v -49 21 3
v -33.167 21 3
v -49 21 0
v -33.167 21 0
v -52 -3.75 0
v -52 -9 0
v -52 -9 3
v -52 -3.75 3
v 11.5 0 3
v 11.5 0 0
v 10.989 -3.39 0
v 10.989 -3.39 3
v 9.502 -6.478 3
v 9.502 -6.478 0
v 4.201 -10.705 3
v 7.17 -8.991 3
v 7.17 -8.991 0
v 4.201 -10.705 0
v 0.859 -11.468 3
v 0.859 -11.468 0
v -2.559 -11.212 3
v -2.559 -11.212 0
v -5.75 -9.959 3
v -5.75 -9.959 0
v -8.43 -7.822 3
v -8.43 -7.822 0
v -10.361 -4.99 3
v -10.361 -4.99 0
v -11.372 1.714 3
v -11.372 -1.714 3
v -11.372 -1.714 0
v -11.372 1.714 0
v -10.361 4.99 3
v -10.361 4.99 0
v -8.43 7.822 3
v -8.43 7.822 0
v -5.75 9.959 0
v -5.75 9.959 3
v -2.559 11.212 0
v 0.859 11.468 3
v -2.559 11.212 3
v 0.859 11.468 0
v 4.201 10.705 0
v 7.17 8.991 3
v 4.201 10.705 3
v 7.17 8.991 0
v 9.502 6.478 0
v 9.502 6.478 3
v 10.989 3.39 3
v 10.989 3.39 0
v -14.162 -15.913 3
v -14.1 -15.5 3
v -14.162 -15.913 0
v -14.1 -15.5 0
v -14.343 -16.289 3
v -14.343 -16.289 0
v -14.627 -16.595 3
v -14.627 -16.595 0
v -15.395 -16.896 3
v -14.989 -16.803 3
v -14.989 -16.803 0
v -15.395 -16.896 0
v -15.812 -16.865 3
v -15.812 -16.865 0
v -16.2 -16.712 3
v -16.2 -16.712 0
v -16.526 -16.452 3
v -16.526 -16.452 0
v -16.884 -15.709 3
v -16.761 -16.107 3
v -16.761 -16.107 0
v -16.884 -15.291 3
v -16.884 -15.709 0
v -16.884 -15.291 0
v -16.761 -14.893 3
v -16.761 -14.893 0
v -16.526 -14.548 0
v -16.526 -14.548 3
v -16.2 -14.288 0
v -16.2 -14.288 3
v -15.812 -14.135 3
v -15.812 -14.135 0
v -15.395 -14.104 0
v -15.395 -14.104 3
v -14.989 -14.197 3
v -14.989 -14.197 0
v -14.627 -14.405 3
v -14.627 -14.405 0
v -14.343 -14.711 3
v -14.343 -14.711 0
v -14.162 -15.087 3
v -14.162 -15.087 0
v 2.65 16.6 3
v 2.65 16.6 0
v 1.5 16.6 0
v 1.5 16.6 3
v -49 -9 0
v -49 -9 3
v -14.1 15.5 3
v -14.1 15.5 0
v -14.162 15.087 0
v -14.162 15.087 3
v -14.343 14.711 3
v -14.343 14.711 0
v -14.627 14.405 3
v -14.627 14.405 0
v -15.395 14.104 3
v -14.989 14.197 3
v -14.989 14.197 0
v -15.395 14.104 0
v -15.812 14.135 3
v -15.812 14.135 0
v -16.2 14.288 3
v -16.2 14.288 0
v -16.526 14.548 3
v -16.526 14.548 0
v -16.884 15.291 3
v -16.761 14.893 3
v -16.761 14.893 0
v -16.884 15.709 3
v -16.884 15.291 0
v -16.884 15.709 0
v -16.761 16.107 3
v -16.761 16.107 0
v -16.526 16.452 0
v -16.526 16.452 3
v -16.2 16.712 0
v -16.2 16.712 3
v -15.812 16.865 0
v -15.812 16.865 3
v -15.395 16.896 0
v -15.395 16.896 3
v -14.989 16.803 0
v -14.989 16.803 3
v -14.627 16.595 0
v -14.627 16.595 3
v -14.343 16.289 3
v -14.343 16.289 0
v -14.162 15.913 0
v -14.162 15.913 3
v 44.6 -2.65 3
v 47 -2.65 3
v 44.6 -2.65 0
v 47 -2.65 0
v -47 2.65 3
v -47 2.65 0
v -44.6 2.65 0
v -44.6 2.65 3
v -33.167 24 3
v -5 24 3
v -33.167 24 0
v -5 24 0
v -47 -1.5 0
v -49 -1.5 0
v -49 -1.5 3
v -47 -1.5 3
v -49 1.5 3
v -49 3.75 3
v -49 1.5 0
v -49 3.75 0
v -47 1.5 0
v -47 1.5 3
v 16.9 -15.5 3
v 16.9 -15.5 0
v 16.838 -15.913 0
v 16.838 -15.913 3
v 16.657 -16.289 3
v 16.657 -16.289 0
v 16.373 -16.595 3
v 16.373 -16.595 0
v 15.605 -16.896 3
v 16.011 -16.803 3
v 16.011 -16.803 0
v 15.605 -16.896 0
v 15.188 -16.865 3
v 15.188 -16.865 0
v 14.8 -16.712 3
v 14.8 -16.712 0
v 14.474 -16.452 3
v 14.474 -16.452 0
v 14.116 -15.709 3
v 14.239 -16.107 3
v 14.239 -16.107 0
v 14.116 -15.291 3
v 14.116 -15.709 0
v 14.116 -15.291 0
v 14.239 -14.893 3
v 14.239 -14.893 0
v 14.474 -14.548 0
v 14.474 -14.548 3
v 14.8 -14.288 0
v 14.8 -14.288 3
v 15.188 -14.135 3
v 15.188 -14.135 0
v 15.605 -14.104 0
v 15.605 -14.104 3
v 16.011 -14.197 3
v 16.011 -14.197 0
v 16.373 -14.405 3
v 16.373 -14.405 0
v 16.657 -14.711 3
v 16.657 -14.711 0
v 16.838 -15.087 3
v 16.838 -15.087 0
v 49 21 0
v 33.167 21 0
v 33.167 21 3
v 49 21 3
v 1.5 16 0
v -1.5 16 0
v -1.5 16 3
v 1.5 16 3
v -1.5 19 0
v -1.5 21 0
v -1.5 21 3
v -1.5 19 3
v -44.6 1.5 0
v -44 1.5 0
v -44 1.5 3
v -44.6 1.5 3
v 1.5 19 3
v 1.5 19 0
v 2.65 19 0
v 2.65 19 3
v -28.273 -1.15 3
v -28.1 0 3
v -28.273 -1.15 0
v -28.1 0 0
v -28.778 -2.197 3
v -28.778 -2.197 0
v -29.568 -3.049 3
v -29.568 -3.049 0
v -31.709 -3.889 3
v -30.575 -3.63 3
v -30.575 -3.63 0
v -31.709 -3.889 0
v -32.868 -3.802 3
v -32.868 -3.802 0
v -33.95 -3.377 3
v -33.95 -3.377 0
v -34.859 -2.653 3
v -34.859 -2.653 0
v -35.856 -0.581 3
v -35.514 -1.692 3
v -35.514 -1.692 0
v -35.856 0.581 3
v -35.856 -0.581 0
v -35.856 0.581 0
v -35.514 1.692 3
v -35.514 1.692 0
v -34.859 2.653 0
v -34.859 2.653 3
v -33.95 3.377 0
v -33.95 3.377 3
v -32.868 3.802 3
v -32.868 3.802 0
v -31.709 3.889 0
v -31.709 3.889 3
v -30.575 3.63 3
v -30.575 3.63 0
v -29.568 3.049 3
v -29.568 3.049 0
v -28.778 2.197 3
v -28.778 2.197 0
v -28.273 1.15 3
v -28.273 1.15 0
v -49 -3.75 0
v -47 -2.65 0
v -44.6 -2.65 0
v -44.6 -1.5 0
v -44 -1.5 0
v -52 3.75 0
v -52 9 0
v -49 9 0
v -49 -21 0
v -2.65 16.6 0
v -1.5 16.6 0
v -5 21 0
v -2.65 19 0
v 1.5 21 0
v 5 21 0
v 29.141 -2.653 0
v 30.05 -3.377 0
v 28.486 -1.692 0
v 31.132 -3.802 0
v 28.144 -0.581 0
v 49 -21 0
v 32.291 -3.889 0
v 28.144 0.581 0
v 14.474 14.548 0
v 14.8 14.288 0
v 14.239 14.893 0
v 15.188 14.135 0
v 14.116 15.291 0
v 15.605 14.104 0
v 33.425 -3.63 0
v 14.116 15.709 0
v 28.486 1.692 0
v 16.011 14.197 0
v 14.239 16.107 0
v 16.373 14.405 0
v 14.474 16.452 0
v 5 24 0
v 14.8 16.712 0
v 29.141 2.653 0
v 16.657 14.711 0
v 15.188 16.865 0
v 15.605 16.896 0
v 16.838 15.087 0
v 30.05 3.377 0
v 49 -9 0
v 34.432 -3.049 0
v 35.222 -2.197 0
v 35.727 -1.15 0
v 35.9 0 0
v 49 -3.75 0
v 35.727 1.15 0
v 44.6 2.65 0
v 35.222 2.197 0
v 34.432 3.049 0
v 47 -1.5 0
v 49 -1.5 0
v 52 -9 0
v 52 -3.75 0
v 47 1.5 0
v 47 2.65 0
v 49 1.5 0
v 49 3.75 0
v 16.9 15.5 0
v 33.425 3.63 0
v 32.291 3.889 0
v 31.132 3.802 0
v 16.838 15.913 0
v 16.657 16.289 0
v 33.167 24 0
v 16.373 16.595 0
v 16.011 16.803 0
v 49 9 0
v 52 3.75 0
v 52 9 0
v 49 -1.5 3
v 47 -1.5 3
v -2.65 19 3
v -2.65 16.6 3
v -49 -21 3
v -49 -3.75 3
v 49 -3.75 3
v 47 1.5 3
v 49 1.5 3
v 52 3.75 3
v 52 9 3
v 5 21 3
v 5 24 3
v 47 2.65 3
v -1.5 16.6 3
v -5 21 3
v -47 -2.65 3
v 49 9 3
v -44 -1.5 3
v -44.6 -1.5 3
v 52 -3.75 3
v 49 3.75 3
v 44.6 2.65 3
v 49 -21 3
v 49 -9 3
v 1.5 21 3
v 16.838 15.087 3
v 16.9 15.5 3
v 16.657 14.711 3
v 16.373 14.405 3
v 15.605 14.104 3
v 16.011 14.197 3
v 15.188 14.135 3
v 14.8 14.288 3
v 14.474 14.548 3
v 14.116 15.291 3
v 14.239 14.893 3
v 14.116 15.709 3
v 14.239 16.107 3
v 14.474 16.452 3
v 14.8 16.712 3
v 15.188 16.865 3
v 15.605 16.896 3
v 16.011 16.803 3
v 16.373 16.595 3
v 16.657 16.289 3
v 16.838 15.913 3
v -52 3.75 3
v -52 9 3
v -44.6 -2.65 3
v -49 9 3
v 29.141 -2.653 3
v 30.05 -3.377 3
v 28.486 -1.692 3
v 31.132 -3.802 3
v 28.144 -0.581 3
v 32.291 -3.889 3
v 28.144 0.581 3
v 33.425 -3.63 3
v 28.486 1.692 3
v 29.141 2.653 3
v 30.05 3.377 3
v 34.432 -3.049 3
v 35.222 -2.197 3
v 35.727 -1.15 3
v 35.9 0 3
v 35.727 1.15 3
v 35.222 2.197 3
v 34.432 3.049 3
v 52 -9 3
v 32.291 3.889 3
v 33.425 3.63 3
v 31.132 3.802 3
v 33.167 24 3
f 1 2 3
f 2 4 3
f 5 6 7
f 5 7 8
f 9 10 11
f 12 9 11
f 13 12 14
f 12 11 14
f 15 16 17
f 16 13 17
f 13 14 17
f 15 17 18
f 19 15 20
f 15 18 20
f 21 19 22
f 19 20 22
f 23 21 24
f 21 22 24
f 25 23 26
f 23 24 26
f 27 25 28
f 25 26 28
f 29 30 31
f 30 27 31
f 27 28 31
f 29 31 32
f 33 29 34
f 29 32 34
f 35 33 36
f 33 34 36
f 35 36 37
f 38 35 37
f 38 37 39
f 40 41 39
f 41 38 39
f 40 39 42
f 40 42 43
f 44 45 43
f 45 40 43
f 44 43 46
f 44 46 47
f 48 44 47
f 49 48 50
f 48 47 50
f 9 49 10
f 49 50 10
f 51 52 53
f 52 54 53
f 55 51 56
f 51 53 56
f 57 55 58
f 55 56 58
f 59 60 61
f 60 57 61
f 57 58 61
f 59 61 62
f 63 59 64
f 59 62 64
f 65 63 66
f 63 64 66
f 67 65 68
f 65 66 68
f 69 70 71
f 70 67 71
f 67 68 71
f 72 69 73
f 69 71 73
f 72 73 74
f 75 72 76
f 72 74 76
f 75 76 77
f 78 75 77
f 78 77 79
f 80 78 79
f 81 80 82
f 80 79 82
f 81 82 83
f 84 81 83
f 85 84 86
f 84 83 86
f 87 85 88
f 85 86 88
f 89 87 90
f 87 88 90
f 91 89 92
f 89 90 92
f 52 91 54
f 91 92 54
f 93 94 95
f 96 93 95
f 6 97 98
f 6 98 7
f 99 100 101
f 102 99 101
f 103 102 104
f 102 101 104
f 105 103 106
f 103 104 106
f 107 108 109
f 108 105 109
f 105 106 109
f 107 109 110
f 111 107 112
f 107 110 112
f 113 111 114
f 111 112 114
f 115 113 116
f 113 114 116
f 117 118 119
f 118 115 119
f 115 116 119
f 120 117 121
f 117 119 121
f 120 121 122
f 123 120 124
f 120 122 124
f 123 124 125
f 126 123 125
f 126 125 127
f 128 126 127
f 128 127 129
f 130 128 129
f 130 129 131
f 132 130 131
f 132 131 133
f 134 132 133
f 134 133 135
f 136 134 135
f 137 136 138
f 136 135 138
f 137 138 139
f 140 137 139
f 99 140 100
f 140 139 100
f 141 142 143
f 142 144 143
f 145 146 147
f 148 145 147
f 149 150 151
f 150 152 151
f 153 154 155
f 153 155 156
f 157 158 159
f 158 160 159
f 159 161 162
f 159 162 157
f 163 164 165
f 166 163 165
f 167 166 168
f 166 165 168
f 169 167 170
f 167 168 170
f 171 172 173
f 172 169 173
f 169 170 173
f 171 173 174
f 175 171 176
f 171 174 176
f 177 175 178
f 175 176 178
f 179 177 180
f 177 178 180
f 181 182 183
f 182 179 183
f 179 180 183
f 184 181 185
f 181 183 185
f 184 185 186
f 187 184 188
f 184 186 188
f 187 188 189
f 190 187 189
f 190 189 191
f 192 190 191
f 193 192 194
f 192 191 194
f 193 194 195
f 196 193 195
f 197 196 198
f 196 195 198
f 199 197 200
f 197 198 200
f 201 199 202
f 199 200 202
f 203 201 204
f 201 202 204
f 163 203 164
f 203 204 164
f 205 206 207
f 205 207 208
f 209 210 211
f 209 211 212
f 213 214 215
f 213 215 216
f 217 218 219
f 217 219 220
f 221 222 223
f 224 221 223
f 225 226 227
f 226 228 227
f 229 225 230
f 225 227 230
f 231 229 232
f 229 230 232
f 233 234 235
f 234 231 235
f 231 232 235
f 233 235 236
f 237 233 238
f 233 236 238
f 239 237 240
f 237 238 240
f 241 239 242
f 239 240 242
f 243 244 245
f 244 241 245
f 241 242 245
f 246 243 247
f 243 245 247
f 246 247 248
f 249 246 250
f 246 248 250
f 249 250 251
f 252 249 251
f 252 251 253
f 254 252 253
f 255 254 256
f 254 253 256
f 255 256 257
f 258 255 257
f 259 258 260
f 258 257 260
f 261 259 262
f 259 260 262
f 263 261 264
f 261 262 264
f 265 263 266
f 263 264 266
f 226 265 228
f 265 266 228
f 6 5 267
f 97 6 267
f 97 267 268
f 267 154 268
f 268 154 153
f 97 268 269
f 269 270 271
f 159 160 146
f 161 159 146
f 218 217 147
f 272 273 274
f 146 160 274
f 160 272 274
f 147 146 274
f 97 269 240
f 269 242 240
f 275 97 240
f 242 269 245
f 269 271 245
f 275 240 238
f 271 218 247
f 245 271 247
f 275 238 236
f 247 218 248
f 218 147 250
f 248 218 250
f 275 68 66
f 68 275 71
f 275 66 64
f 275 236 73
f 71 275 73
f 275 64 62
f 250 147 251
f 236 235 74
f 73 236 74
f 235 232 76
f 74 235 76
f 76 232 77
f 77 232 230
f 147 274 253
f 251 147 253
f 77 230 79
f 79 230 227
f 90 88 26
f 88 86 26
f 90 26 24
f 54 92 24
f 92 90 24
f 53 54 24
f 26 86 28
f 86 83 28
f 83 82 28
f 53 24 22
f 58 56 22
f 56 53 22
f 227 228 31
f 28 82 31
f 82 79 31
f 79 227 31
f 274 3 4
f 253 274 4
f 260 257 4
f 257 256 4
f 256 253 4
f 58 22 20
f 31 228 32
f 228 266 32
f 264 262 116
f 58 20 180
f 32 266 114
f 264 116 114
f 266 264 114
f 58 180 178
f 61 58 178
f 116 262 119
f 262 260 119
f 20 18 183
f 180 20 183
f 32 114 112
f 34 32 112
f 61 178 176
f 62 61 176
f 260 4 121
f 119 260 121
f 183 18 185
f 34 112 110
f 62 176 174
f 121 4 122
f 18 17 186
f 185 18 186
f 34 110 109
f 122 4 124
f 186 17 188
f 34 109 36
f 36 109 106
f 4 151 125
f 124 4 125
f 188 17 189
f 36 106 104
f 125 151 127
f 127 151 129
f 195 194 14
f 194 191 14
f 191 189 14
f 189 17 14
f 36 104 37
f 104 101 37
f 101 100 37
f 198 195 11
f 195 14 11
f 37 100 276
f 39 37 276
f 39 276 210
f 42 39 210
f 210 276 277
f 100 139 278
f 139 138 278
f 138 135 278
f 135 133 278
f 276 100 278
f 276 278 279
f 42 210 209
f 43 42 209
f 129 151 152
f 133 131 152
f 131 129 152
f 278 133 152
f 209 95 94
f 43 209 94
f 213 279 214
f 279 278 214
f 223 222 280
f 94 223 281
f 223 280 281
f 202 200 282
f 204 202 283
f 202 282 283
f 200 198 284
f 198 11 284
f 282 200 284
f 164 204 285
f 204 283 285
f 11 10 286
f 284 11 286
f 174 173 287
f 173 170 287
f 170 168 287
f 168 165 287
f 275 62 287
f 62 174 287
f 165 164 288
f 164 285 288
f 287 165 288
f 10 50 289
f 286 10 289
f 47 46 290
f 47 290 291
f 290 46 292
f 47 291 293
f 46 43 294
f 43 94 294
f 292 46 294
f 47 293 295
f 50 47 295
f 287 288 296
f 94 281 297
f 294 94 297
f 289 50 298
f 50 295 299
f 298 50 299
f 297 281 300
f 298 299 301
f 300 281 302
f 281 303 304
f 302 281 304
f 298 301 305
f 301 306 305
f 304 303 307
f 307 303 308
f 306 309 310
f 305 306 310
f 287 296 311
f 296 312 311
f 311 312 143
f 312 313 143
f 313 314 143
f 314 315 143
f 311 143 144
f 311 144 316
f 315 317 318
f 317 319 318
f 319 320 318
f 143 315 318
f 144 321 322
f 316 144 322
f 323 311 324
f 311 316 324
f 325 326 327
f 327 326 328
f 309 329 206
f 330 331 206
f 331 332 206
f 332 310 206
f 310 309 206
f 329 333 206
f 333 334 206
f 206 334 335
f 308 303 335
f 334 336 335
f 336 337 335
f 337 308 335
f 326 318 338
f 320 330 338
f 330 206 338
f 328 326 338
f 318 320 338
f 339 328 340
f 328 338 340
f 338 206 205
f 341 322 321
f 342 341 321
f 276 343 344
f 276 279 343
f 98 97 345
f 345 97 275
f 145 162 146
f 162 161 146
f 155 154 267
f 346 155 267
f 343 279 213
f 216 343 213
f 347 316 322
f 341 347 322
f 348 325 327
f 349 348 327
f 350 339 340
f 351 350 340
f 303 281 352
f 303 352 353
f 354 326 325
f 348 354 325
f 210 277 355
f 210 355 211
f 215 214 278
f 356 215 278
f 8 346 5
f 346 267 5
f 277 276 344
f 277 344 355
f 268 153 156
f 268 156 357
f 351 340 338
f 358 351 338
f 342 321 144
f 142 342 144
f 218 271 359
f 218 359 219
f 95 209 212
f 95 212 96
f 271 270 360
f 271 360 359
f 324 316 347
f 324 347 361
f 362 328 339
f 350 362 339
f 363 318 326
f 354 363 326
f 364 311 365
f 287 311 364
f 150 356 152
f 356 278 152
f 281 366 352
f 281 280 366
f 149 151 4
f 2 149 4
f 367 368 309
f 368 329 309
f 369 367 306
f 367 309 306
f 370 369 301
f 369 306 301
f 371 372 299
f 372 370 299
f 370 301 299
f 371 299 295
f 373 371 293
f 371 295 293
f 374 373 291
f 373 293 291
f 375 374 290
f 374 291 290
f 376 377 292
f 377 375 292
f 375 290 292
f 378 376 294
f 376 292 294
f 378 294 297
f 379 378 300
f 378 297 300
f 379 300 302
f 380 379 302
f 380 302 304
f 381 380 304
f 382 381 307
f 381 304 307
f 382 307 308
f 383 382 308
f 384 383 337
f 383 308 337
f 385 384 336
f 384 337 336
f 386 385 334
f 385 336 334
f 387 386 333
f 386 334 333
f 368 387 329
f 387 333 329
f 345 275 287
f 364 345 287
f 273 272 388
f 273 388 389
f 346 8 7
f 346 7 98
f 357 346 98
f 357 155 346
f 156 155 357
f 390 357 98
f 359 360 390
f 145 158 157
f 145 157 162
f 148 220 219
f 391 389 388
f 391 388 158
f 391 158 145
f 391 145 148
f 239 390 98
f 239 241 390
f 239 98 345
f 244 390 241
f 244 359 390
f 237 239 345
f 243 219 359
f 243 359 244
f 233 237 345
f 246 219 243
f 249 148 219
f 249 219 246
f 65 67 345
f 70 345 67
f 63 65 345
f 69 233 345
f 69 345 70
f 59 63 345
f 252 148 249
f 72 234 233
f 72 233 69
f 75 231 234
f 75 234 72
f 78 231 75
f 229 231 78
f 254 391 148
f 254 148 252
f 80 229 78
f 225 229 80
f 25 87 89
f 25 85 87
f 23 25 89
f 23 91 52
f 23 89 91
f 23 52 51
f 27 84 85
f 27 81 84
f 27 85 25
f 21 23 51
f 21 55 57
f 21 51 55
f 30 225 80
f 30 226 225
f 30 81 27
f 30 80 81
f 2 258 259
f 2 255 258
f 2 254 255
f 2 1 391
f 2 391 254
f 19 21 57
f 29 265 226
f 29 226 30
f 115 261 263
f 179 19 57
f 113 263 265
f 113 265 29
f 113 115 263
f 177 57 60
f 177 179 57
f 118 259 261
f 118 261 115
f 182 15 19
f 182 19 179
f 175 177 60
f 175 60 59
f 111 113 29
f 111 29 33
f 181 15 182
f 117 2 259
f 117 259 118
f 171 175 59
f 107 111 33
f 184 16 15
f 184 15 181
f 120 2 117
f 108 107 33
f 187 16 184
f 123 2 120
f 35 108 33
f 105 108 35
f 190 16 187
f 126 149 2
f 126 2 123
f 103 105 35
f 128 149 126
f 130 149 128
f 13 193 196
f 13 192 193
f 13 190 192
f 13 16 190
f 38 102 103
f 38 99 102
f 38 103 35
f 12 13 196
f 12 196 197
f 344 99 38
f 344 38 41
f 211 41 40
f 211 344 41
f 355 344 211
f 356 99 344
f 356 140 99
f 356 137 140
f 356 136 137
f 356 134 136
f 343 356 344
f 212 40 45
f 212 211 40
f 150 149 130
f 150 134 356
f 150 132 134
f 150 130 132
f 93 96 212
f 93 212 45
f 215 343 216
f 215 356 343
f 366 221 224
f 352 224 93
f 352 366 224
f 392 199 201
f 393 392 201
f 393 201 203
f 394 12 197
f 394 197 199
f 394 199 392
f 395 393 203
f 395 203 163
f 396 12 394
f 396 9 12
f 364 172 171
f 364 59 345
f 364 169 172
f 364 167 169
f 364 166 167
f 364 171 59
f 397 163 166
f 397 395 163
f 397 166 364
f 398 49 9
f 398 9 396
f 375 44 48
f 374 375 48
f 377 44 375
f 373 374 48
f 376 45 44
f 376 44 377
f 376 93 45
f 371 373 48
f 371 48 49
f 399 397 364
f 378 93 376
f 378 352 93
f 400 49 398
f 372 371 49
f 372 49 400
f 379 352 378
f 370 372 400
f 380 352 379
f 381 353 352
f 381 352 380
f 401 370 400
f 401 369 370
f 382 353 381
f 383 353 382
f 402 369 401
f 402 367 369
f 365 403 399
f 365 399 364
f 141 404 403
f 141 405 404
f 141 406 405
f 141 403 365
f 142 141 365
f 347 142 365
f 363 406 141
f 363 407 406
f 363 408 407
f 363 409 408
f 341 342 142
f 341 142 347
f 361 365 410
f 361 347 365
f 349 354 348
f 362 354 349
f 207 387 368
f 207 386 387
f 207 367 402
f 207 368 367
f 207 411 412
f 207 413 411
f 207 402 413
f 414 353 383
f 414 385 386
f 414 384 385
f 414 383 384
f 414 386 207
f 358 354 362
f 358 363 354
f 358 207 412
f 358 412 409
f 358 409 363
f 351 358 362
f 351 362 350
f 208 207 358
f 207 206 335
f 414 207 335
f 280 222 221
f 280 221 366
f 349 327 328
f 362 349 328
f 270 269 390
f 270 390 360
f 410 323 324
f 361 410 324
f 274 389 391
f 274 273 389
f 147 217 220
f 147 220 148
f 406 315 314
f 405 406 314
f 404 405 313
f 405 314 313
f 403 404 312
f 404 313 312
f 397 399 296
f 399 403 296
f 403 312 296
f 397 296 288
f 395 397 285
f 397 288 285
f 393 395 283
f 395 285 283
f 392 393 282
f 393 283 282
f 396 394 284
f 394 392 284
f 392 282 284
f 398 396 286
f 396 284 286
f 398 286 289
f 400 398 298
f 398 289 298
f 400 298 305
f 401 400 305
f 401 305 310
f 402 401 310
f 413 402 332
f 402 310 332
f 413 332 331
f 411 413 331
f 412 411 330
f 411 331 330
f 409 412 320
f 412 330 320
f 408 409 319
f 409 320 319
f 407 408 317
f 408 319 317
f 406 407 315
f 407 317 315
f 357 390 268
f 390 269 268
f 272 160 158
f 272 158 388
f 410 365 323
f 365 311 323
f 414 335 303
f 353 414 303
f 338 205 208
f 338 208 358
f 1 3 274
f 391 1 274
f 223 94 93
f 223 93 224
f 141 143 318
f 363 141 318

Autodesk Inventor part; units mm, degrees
ref_plane "YZ Plane" through (0, 0, 0) normal (1, 0, 0) x (0, 1, 0)
ref_plane "XZ Plane" through (0, 0, 0) normal (0, 1, 0) x (-1, 0, 0)
ref_plane "XY Plane" through (0, 0, 0) normal (0, 0, 1) x (1, 0, 0)
sketch "Sketch12" plane through (0, 0, 0) normal (0, 0, 1) x (1, 0, 0)
  line L0 (-49, -21) -> (49, -21)
  line L1 (-49, 21) -> (-49, 9)
  line L2 (-49, -9) -> (-52, -9)
  line L3 (-52, -9) -> (-52, -3.75)
  line L4 (-52, 9) -> (-49, 9)
  line L5 (-49, -3.75) -> (-52, -3.75)
  line L6 (-49, 3.75) -> (-52, 3.75)
  line L7 (-44, -1.5) -> (-44, 1.5)
  line L8 (-49, 1.5) -> (-49, -1.5)
  line L9 (-49, -3.75) -> (-49, -9)
  line L10 (-49, 1.5) -> (-49, -1.5)
  line L11 (-49, 3.75) -> (-49, 1.5)
  line L12 (-47, -1.5) -> (-47, -2.65)
  line L13 (-44.6, -2.65) -> (-47, -2.65)
  line L14 (-44.6, -2.65) -> (-44.6, -1.5)
  line L15 (-44.6, 1.5) -> (-44.6, 2.65)
  line L16 (-47, 2.65) -> (-44.6, 2.65)
  line L17 (-47, 1.5) -> (-47, 2.65)
  line L18 (-49, -1.5) -> (-47, -1.5)
  line L19 (-44.6, -1.5) -> (-44, -1.5)
  line L20 (-44, 1.5) -> (-44.6, 1.5)
  line L21 (-47, 1.5) -> (-49, 1.5)
  line L22 (0, -30) -> (0, 33) construction
  line L23 (33.1667, 21) -> (33.1667, 24)
  line L24 (33.1667, 24) -> (5, 24)
  line L25 (-33.1667, 24) -> (-33.1667, 21)
  line L26 (-33.1667, 21) -> (-49, 21)
  line L27 (33.1667, 21) -> (49, 21)
  line L28 (-5, 21) -> (-5, 24)
  line L29 (5, 21) -> (5, 24)
  line L30 (-1.5, 21) -> (-1.5, 19)
  line L31 (-2.65, 19) -> (-1.5, 19)
  line L32 (-2.65, 19) -> (-2.65, 16.6)
  line L33 (-2.65, 16.6) -> (-1.5, 16.6)
  line L34 (-1.5, 16.6) -> (-1.5, 16)
  line L35 (-1.5, 16) -> (1.5, 16)
  line L36 (1.5, 16) -> (1.5, 16.6)
  line L37 (2.65, 16.6) -> (1.5, 16.6)
  line L38 (2.65, 16.6) -> (2.65, 19)
  line L39 (1.5, 19) -> (2.65, 19)
  line L40 (1.5, 19) -> (1.5, 21)
  line L41 (1.5, 21) -> (5, 21)
  line L42 (-5, 24) -> (-33.1667, 24)
  line L43 (5, 24) -> (-5, 24)
  line L44 (-1.5, 21) -> (-5, 21)
  circle A0 centre (0, 0) radius 11.5 projected
  circle A1 centre (32, 0) radius 3.9 projected
  circle A2 centre (-32, 0) radius 3.9 projected
  line L45 (2.65, 19) -> (2.65, 16.6) projected
  line L46 (2.65, 16.6) -> (-2.65, 16.6) projected
  line L47 (-2.65, 16.6) -> (-2.65, 19) projected
  line L48 (-2.65, 19) -> (2.65, 19) projected
  line L49 (44.6, 2.65) -> (47, 2.65) projected
  line L50 (47, 2.65) -> (47, -2.65) projected
  line L51 (47, -2.65) -> (44.6, -2.65) projected
  line L52 (44.6, -2.65) -> (44.6, 2.65) projected
  line L53 (-44.6, 2.65) -> (-44.6, -2.65) projected
  line L54 (-44.6, -2.65) -> (-47, -2.65) projected
  line L55 (-47, -2.65) -> (-47, 2.65) projected
  line L56 (-47, 2.65) -> (-44.6, 2.65) projected
  circle A3 centre (-15.5, -15.5) radius 1.4 projected
  circle A4 centre (-15.5, 15.5) radius 1.4 projected
  circle A5 centre (15.5, 15.5) radius 1.4 projected
  circle A6 centre (15.5, -15.5) radius 1.4 projected
  line L57 (-52, -21) -> (52, -21) projected
  line L58 (52, -21) -> (52, -10.5) projected
  line L59 (52, -10.5) -> (49, -10.5) projected
  line L60 (49, -10.5) -> (49, 10.5) projected
  line L61 (49, 10.5) -> (52, 10.5) projected
  line L62 (52, 10.5) -> (52, 24) projected
  line L63 (52, 24) -> (34.6667, 24) projected
  line L64 (34.6667, 24) -> (34.6667, 21) projected
  line L65 (34.6667, 21) -> (-34.6667, 21) projected
  line L66 (-34.6667, 21) -> (-34.6667, 24) projected
  line L67 (-34.6667, 24) -> (-52, 24) projected
  line L68 (-52, 24) -> (-52, 10.5) projected
  line L69 (-52, 10.5) -> (-49, 10.5) projected
  line L70 (-49, 10.5) -> (-49, -10.5) projected
  line L71 (-49, -10.5) -> (-52, -10.5) projected
  line L72 (-52, -10.5) -> (-52, -21) projected
  line L73 (-52, -3.75) -> (-52, 3.75)
  line L74 (-52, 3.75) -> (-52, 9)
  line L75 (-72.8, 0) -> (72.8, 0) construction
  line L76 (-49, -9) -> (-49, -21)
  line L77 (-49, 9) -> (-49, 3.75)
  line L78 (-49, -1.5) -> (-49, -3.75)
  line L79 (49, 21) -> (49, 9)
  line L80 (49, -9) -> (52, -9)
  line L81 (52, -9) -> (52, -3.75)
  line L82 (52, 9) -> (49, 9)
  line L83 (49, -3.75) -> (52, -3.75)
  line L84 (49, 3.75) -> (52, 3.75)
  line L85 (44, -1.5) -> (44, 1.5)
  line L86 (49, -3.75) -> (49, -9)
  line L87 (49, 1.5) -> (49, -1.5)
  line L88 (49, 3.75) -> (49, 1.5)
  line L89 (47, -1.5) -> (47, -2.65)
  line L90 (44.6, -2.65) -> (47, -2.65)
  line L91 (44.6, -2.65) -> (44.6, -1.5)
  line L92 (44.6, 1.5) -> (44.6, 2.65)
  line L93 (47, 2.65) -> (44.6, 2.65)
  line L94 (47, 1.5) -> (47, 2.65)
  line L95 (49, -1.5) -> (47, -1.5)
  line L96 (44.6, -1.5) -> (44, -1.5)
  line L97 (44, 1.5) -> (44.6, 1.5)
  line L98 (47, 1.5) -> (49, 1.5)
  line L99 (52, -3.75) -> (52, 3.75)
  line L100 (52, 3.75) -> (52, 9)
  line L101 (49, -9) -> (49, -21)
  line L102 (49, 9) -> (49, 3.75)
  line L103 (49, -1.5) -> (49, -3.75)
  point P0 (0, 0)
  dimension "d102" = 3
  dimension "d103" = 5
  dimension "d108" = 3
  dimension "d109" = 5
  dimension "d113" = 1.5
  dimension "d114" = 1.5
  dimension "d115" = 10
  dimension "d116" = 5.3
  dimension "d117" = 7.5
extrude "Extrusion9" add sketch "Sketch12" along normal blind 3 contours L76 L70 L9 L18 L12 L13 L14 L19 L7 L20 L15 L16 L17 L21 L11 L1 L26 L65 L44 L30 L31 L32 L33 L34 L35 L36 L37 L38 L39 L40 L41 L27 L79 L60 L98 L50 L49 L52 L97 L85 L96 L51 L95 L101 L0 | L2 L3 L5 L9 | L60 L83 L81 L80 | L74 L4 L70 L6 | L84 L60 L82 L100 | L96 L85 L97 L52 | L25 L42 L28 L65 | L65 L29 L24 L23
properties part number "X-Motor-Housing_Front-Outer"
